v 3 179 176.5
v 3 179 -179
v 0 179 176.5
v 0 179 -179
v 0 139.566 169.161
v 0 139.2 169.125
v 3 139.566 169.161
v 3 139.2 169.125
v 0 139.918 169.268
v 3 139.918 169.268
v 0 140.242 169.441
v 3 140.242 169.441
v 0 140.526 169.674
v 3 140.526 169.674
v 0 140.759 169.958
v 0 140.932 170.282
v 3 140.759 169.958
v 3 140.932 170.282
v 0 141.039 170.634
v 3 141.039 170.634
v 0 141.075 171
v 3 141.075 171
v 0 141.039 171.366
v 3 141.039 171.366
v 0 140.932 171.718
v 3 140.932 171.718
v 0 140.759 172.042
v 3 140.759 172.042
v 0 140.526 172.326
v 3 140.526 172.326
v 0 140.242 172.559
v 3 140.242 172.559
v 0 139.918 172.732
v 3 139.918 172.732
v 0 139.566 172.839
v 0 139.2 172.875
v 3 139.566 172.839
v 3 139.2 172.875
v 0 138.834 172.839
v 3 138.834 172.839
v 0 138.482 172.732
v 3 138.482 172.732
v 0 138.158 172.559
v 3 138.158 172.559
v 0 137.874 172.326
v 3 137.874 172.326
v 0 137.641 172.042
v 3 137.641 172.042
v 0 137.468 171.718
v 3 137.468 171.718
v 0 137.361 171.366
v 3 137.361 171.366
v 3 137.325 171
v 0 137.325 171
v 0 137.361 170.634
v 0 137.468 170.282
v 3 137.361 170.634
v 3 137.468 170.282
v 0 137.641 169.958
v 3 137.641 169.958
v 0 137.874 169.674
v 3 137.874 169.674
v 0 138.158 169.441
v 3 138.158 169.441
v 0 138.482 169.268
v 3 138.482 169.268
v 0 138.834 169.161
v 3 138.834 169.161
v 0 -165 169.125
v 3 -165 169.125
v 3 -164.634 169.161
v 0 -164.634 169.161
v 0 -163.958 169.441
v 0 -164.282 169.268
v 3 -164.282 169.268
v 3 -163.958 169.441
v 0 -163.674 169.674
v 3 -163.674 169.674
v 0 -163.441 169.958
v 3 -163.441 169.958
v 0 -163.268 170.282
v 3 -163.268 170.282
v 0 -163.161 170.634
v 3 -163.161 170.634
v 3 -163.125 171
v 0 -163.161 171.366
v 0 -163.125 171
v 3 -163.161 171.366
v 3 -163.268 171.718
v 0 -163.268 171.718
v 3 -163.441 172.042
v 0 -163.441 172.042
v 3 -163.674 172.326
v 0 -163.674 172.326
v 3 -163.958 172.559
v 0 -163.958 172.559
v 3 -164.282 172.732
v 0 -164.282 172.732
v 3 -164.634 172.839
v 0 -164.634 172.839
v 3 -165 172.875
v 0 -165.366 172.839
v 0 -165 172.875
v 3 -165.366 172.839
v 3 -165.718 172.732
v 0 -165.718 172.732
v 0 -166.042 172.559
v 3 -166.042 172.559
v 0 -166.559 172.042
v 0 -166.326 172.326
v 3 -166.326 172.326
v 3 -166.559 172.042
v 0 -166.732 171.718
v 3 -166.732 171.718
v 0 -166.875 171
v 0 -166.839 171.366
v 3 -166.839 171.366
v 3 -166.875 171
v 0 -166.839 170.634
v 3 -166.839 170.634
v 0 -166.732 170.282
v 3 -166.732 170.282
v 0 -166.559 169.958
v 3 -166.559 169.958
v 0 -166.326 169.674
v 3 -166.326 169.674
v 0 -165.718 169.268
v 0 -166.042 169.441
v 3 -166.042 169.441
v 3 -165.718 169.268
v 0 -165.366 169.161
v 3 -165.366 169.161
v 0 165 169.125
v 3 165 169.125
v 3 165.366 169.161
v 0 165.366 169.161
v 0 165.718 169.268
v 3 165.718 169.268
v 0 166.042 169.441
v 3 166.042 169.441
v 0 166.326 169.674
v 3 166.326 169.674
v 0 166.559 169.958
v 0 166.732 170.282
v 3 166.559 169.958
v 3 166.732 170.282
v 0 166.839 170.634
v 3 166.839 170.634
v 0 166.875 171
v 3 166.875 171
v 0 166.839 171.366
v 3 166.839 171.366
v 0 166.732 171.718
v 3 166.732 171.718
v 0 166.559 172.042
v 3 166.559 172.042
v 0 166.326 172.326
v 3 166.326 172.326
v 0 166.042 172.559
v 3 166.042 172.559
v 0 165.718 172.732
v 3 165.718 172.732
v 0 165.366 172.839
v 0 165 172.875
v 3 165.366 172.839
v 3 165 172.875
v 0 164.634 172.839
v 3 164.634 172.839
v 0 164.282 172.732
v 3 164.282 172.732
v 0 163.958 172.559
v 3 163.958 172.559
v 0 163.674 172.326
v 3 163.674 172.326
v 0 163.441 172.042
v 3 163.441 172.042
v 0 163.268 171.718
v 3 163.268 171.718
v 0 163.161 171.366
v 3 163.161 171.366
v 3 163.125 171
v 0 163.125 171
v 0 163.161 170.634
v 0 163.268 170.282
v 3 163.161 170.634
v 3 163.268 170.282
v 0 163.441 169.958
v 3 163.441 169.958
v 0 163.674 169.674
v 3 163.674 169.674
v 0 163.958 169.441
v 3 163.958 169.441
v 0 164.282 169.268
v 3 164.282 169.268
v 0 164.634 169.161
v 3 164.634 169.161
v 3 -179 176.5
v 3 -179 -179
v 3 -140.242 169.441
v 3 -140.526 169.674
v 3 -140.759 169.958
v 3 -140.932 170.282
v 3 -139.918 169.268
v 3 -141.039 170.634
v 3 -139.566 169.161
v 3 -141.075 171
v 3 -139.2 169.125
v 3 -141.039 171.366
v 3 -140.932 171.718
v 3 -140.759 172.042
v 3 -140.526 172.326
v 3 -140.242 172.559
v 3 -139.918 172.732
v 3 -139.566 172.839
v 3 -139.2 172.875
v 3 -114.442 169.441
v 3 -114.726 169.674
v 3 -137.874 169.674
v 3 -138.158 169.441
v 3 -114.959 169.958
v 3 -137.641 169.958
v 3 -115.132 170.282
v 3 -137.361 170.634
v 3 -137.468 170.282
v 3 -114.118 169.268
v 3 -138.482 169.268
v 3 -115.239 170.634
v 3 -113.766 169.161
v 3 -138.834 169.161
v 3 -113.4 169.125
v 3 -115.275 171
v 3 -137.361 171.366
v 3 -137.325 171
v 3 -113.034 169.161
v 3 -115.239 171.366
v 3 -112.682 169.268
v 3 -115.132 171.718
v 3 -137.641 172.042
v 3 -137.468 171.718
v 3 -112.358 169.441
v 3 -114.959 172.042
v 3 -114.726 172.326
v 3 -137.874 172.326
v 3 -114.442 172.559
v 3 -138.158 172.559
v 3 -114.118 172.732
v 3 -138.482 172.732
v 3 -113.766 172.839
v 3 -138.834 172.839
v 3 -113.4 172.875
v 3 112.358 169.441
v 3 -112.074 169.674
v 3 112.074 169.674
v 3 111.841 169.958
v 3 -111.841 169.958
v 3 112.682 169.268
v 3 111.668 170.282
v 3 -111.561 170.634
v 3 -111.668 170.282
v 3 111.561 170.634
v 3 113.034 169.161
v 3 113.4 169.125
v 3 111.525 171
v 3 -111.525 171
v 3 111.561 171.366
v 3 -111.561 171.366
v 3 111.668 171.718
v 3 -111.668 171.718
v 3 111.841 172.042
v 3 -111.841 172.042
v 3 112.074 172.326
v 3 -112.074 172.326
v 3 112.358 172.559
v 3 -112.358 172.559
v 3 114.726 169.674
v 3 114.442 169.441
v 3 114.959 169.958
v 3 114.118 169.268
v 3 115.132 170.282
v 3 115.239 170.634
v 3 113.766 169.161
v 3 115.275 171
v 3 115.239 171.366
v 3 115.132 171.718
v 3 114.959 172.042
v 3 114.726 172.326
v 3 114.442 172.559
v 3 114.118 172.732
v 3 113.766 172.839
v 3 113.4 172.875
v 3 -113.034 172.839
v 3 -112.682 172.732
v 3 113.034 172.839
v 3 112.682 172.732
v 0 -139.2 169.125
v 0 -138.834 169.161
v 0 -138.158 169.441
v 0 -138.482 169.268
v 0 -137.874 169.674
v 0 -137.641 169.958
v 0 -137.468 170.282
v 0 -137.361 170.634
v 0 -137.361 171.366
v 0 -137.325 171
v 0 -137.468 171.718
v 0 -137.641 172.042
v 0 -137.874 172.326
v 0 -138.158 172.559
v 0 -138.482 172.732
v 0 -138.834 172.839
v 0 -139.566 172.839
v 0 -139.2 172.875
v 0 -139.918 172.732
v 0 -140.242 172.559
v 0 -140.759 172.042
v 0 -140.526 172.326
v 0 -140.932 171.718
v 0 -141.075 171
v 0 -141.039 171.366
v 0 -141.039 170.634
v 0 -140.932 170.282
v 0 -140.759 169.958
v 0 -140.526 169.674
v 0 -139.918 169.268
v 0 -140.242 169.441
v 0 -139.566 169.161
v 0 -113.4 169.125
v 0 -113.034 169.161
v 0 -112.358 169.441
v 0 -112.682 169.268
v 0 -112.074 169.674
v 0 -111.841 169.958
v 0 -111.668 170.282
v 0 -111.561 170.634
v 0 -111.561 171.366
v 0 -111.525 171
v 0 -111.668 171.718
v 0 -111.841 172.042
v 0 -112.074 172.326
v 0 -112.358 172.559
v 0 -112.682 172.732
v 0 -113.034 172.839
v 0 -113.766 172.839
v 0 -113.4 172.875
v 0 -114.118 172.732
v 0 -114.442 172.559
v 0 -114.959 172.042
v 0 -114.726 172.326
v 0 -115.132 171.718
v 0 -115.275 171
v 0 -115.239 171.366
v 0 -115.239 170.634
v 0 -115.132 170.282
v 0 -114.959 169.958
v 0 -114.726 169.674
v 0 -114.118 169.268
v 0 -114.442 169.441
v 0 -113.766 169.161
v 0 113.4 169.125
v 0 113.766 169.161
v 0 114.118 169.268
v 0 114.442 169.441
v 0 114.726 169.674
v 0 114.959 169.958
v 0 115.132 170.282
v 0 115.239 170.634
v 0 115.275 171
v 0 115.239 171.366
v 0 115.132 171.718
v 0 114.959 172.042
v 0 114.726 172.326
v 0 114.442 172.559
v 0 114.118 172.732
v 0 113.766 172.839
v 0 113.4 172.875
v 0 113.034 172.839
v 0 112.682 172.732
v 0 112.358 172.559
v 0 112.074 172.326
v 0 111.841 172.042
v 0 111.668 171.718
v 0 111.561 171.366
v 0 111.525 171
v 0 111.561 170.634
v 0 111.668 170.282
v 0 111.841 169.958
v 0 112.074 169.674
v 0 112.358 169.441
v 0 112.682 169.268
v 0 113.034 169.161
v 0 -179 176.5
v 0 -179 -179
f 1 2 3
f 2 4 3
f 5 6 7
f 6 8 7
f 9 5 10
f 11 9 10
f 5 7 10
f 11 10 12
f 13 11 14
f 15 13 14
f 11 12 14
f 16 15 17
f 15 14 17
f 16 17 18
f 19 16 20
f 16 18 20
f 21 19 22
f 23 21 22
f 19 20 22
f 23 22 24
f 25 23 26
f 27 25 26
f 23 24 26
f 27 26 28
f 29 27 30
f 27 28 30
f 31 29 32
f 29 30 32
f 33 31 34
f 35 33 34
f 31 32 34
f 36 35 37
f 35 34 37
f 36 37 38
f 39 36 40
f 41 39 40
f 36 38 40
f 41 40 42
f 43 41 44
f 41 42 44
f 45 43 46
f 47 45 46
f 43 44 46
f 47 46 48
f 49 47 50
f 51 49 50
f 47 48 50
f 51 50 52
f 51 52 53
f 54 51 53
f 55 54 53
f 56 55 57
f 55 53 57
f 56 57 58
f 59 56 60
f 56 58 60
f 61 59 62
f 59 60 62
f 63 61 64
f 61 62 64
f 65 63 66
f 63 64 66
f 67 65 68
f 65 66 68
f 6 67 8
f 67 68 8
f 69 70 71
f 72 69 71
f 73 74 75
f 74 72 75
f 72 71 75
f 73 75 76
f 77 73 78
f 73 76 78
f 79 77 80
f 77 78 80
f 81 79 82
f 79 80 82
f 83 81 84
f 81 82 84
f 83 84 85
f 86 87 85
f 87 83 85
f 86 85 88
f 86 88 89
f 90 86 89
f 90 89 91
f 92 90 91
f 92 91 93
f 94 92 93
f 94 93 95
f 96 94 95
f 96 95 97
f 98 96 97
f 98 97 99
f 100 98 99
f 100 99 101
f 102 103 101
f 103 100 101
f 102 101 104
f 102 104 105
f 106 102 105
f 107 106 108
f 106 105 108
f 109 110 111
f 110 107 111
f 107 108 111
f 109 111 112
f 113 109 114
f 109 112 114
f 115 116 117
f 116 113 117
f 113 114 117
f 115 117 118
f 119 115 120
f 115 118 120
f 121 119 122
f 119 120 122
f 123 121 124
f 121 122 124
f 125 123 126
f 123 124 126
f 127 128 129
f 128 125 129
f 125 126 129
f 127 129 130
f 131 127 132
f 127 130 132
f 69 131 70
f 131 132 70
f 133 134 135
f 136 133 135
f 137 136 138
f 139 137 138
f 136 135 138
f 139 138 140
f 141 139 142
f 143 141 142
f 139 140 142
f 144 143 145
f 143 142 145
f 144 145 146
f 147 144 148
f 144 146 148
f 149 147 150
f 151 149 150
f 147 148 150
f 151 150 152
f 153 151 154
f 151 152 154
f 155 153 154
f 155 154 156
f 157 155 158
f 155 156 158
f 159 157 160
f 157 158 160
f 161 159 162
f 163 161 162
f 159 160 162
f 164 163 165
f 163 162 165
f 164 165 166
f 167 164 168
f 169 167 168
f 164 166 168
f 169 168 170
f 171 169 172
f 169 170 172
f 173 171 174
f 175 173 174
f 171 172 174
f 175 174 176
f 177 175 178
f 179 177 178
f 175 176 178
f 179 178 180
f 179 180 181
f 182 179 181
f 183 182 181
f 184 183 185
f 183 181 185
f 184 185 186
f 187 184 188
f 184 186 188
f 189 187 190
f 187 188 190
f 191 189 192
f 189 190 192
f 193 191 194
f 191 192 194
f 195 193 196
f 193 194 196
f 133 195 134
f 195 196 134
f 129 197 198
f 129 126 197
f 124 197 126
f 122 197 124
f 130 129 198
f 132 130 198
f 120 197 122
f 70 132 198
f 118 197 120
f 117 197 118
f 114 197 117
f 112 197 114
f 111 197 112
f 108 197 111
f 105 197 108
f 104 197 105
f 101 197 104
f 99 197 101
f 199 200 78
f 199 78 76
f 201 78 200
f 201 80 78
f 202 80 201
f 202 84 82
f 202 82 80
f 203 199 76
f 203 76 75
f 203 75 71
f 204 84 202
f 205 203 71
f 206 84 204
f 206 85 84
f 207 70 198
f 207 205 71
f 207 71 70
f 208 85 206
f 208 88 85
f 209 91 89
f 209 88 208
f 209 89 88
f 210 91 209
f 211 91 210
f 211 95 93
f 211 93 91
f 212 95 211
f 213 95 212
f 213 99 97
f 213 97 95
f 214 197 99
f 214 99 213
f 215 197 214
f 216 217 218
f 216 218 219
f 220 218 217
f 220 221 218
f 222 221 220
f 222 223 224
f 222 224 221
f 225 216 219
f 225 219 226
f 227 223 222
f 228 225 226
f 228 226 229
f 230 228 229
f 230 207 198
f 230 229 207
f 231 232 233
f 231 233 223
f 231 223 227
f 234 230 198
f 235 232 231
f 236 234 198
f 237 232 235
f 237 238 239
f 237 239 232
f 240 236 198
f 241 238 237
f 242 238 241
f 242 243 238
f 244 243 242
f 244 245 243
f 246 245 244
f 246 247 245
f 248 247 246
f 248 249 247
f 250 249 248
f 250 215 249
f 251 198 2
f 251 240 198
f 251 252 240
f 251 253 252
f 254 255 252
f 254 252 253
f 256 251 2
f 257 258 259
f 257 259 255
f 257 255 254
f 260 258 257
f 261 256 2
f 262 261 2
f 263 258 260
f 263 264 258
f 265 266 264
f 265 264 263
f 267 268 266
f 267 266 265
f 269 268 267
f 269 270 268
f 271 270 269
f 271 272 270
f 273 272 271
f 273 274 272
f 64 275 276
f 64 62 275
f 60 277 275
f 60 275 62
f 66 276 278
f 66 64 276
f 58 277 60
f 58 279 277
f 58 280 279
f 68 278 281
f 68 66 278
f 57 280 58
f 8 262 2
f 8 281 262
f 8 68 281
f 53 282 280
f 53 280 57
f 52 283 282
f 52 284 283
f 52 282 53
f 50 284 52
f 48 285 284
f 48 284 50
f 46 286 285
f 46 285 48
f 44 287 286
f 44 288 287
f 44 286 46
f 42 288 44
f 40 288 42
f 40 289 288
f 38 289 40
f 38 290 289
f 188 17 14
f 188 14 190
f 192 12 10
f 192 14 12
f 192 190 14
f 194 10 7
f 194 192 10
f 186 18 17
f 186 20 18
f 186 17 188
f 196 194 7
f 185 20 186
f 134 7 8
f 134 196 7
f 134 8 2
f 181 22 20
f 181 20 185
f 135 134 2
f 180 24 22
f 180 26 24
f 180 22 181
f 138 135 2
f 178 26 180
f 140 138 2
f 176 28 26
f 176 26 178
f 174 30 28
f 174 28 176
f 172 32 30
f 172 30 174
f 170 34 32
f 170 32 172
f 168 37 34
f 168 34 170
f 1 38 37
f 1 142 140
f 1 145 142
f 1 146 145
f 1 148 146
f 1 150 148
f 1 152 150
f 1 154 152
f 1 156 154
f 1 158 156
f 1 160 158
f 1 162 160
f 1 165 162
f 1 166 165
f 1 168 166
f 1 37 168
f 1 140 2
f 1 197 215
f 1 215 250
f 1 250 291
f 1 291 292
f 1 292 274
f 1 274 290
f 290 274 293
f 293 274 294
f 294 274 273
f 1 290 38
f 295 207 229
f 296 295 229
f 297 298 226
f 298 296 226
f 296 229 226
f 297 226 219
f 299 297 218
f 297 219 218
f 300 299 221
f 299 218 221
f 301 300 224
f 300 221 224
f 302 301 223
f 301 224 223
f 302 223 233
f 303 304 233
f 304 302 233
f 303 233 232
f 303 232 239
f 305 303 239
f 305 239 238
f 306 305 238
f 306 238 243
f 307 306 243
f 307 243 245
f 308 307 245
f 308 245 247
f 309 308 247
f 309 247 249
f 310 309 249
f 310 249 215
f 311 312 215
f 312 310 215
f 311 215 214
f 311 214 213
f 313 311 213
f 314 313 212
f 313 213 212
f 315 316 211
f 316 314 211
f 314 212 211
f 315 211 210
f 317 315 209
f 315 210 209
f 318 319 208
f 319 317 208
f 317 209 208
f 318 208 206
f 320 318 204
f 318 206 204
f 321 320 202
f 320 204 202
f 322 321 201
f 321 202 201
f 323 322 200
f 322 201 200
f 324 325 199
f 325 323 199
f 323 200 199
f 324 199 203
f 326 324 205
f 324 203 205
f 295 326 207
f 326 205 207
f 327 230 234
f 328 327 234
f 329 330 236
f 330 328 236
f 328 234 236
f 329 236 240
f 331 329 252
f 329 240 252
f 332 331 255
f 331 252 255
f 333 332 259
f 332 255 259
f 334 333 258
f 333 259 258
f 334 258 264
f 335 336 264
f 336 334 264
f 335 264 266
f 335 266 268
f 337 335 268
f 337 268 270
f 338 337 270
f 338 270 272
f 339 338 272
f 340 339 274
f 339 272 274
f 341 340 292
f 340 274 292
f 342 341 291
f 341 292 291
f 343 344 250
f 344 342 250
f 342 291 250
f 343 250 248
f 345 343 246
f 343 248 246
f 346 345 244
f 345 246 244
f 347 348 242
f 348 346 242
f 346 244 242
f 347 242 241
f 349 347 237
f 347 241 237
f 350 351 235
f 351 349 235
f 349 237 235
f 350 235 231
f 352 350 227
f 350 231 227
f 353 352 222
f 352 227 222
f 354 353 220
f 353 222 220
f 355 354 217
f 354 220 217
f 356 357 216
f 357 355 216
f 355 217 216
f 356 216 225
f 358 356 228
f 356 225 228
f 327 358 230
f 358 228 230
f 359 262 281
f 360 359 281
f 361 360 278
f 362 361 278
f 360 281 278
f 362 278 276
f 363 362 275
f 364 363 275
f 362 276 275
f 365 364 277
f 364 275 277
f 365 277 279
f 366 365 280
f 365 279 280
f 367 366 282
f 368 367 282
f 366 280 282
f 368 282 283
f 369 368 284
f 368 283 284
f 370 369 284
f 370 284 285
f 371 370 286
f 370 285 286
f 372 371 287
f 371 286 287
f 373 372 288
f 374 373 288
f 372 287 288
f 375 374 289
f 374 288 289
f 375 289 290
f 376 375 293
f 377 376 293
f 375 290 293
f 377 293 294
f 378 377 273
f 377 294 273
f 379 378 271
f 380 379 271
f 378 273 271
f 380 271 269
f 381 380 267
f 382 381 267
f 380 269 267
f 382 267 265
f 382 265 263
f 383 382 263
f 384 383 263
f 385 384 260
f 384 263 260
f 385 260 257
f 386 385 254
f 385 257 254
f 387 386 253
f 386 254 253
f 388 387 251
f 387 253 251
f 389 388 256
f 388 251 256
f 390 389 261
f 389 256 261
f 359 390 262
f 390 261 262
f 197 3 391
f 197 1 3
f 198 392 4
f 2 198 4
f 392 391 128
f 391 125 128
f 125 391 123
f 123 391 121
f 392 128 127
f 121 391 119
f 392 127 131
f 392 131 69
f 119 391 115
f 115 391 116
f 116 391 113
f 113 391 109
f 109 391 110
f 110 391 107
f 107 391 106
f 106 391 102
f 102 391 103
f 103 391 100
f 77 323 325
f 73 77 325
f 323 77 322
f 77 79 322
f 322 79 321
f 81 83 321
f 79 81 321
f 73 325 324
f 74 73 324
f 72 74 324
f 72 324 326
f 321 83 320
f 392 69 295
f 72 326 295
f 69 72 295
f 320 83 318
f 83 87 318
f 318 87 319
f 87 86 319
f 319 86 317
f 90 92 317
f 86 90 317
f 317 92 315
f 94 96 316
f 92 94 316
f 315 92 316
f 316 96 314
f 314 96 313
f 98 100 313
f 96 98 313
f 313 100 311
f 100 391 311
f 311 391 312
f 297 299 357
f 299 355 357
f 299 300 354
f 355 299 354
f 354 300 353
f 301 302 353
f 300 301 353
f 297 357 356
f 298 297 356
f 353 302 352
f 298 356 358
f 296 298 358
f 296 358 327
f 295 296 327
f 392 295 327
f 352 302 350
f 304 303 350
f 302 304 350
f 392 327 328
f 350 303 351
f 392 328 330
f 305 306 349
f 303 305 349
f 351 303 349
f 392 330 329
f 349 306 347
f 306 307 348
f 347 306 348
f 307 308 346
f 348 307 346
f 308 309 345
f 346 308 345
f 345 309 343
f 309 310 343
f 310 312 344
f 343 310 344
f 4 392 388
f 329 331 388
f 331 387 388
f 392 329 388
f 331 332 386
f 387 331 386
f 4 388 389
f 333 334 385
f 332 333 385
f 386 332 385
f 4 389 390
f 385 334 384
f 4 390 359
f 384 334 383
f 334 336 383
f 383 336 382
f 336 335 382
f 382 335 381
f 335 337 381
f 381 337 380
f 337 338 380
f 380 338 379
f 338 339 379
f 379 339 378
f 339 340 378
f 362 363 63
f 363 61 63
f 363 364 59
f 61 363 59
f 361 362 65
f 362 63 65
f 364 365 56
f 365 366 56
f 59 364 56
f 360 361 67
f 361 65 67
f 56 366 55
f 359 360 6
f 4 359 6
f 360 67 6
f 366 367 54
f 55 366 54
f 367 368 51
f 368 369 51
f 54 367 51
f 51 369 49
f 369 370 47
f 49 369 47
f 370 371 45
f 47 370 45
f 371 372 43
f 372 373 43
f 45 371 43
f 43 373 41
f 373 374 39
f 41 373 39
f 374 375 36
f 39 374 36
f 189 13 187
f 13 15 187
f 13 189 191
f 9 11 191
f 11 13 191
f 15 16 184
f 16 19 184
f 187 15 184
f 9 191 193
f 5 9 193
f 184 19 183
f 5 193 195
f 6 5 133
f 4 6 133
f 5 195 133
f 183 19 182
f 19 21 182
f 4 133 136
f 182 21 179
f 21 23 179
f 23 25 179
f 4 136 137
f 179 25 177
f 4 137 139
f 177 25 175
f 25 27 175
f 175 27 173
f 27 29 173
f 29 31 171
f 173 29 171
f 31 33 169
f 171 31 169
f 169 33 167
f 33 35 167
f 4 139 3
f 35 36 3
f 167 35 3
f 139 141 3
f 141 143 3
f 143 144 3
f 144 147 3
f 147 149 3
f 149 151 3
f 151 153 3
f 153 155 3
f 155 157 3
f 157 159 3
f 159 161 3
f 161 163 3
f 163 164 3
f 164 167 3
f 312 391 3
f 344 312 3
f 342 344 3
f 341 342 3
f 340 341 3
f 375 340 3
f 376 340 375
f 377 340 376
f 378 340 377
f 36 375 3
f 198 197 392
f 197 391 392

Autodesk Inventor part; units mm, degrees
ref_plane "YZ Plane" through (0, 0, 0) normal (1, 0, 0) x (0, 1, 0)
ref_plane "XZ Plane" through (0, 0, 0) normal (0, 1, 0) x (-1, 0, 0)
ref_plane "XY Plane" through (0, 0, 0) normal (0, 0, 1) x (1, 0, 0)
sketch "Sketch1" plane through (0, 0, 0) normal (1, 0, 0) x (0, 1, 0)
  line L0 (179, 179) -> (-179, 179)
  line L1 (-179, 179) -> (-179, -179)
  line L2 (-179, -179) -> (179, -179)
  line L3 (179, -179) -> (179, 179)
  line L4 (179, 179) -> (-179, -179) construction
  line L5 (-179, 179) -> (179, -179) construction
  point P0 (0, 0)
  dimension "d0" = 358
  dimension "d1" = 358
extrude "Extrusion1" add sketch "Sketch1" along normal blind 3
sketch "Sketch2" plane through (3, 0, 0) normal (1, 0, 0) x (0, 0, -1)
  circle A0 centre (-171, 165) radius 1.875
  circle A1 centre (-171, 139.2) radius 1.875
  circle A2 centre (-171, 113.4) radius 1.875
  line L0 (179, 179) -> (-179, 179) projected
  line L1 (-179, 179) -> (-179, -179) projected
  point P0 (0, 0)
  dimension "d4" = 3.75
  dimension "d5" = 3.75
  dimension "d6" = 3.75
  dimension "d7" = 14
  dimension "d8" = 25.8
  dimension "d9" = 25.8
  dimension "d10" = 8
extrude "Extrusion2" cut sketch "Sketch2" against normal blind 3
mirror "Mirror1" about plane through (0, 0, 0) normal (0, 1, 0) of "Extrusion2"
sketch "Sketch3" plane through (3, 0, 0) normal (1, 0, 0) x (0, 0, -1)
  line L0 (-179, 179) -> (-176.5, 179)
  line L1 (179, 179) -> (-179, 179) projected
  line L2 (-176.5, 179) -> (-176.5, -179)
  line L3 (-179, -179) -> (179, -179) projected
  line L4 (-176.5, -179) -> (-179, -179)
  line L5 (-179, -179) -> (-179, 179)
  point P0 (0, 0)
  dimension "d13" = 2.5
  dimension "d14" = 90
extrude "Extrusion3" cut sketch "Sketch3" against normal blind 3
properties part number "front_cover"
